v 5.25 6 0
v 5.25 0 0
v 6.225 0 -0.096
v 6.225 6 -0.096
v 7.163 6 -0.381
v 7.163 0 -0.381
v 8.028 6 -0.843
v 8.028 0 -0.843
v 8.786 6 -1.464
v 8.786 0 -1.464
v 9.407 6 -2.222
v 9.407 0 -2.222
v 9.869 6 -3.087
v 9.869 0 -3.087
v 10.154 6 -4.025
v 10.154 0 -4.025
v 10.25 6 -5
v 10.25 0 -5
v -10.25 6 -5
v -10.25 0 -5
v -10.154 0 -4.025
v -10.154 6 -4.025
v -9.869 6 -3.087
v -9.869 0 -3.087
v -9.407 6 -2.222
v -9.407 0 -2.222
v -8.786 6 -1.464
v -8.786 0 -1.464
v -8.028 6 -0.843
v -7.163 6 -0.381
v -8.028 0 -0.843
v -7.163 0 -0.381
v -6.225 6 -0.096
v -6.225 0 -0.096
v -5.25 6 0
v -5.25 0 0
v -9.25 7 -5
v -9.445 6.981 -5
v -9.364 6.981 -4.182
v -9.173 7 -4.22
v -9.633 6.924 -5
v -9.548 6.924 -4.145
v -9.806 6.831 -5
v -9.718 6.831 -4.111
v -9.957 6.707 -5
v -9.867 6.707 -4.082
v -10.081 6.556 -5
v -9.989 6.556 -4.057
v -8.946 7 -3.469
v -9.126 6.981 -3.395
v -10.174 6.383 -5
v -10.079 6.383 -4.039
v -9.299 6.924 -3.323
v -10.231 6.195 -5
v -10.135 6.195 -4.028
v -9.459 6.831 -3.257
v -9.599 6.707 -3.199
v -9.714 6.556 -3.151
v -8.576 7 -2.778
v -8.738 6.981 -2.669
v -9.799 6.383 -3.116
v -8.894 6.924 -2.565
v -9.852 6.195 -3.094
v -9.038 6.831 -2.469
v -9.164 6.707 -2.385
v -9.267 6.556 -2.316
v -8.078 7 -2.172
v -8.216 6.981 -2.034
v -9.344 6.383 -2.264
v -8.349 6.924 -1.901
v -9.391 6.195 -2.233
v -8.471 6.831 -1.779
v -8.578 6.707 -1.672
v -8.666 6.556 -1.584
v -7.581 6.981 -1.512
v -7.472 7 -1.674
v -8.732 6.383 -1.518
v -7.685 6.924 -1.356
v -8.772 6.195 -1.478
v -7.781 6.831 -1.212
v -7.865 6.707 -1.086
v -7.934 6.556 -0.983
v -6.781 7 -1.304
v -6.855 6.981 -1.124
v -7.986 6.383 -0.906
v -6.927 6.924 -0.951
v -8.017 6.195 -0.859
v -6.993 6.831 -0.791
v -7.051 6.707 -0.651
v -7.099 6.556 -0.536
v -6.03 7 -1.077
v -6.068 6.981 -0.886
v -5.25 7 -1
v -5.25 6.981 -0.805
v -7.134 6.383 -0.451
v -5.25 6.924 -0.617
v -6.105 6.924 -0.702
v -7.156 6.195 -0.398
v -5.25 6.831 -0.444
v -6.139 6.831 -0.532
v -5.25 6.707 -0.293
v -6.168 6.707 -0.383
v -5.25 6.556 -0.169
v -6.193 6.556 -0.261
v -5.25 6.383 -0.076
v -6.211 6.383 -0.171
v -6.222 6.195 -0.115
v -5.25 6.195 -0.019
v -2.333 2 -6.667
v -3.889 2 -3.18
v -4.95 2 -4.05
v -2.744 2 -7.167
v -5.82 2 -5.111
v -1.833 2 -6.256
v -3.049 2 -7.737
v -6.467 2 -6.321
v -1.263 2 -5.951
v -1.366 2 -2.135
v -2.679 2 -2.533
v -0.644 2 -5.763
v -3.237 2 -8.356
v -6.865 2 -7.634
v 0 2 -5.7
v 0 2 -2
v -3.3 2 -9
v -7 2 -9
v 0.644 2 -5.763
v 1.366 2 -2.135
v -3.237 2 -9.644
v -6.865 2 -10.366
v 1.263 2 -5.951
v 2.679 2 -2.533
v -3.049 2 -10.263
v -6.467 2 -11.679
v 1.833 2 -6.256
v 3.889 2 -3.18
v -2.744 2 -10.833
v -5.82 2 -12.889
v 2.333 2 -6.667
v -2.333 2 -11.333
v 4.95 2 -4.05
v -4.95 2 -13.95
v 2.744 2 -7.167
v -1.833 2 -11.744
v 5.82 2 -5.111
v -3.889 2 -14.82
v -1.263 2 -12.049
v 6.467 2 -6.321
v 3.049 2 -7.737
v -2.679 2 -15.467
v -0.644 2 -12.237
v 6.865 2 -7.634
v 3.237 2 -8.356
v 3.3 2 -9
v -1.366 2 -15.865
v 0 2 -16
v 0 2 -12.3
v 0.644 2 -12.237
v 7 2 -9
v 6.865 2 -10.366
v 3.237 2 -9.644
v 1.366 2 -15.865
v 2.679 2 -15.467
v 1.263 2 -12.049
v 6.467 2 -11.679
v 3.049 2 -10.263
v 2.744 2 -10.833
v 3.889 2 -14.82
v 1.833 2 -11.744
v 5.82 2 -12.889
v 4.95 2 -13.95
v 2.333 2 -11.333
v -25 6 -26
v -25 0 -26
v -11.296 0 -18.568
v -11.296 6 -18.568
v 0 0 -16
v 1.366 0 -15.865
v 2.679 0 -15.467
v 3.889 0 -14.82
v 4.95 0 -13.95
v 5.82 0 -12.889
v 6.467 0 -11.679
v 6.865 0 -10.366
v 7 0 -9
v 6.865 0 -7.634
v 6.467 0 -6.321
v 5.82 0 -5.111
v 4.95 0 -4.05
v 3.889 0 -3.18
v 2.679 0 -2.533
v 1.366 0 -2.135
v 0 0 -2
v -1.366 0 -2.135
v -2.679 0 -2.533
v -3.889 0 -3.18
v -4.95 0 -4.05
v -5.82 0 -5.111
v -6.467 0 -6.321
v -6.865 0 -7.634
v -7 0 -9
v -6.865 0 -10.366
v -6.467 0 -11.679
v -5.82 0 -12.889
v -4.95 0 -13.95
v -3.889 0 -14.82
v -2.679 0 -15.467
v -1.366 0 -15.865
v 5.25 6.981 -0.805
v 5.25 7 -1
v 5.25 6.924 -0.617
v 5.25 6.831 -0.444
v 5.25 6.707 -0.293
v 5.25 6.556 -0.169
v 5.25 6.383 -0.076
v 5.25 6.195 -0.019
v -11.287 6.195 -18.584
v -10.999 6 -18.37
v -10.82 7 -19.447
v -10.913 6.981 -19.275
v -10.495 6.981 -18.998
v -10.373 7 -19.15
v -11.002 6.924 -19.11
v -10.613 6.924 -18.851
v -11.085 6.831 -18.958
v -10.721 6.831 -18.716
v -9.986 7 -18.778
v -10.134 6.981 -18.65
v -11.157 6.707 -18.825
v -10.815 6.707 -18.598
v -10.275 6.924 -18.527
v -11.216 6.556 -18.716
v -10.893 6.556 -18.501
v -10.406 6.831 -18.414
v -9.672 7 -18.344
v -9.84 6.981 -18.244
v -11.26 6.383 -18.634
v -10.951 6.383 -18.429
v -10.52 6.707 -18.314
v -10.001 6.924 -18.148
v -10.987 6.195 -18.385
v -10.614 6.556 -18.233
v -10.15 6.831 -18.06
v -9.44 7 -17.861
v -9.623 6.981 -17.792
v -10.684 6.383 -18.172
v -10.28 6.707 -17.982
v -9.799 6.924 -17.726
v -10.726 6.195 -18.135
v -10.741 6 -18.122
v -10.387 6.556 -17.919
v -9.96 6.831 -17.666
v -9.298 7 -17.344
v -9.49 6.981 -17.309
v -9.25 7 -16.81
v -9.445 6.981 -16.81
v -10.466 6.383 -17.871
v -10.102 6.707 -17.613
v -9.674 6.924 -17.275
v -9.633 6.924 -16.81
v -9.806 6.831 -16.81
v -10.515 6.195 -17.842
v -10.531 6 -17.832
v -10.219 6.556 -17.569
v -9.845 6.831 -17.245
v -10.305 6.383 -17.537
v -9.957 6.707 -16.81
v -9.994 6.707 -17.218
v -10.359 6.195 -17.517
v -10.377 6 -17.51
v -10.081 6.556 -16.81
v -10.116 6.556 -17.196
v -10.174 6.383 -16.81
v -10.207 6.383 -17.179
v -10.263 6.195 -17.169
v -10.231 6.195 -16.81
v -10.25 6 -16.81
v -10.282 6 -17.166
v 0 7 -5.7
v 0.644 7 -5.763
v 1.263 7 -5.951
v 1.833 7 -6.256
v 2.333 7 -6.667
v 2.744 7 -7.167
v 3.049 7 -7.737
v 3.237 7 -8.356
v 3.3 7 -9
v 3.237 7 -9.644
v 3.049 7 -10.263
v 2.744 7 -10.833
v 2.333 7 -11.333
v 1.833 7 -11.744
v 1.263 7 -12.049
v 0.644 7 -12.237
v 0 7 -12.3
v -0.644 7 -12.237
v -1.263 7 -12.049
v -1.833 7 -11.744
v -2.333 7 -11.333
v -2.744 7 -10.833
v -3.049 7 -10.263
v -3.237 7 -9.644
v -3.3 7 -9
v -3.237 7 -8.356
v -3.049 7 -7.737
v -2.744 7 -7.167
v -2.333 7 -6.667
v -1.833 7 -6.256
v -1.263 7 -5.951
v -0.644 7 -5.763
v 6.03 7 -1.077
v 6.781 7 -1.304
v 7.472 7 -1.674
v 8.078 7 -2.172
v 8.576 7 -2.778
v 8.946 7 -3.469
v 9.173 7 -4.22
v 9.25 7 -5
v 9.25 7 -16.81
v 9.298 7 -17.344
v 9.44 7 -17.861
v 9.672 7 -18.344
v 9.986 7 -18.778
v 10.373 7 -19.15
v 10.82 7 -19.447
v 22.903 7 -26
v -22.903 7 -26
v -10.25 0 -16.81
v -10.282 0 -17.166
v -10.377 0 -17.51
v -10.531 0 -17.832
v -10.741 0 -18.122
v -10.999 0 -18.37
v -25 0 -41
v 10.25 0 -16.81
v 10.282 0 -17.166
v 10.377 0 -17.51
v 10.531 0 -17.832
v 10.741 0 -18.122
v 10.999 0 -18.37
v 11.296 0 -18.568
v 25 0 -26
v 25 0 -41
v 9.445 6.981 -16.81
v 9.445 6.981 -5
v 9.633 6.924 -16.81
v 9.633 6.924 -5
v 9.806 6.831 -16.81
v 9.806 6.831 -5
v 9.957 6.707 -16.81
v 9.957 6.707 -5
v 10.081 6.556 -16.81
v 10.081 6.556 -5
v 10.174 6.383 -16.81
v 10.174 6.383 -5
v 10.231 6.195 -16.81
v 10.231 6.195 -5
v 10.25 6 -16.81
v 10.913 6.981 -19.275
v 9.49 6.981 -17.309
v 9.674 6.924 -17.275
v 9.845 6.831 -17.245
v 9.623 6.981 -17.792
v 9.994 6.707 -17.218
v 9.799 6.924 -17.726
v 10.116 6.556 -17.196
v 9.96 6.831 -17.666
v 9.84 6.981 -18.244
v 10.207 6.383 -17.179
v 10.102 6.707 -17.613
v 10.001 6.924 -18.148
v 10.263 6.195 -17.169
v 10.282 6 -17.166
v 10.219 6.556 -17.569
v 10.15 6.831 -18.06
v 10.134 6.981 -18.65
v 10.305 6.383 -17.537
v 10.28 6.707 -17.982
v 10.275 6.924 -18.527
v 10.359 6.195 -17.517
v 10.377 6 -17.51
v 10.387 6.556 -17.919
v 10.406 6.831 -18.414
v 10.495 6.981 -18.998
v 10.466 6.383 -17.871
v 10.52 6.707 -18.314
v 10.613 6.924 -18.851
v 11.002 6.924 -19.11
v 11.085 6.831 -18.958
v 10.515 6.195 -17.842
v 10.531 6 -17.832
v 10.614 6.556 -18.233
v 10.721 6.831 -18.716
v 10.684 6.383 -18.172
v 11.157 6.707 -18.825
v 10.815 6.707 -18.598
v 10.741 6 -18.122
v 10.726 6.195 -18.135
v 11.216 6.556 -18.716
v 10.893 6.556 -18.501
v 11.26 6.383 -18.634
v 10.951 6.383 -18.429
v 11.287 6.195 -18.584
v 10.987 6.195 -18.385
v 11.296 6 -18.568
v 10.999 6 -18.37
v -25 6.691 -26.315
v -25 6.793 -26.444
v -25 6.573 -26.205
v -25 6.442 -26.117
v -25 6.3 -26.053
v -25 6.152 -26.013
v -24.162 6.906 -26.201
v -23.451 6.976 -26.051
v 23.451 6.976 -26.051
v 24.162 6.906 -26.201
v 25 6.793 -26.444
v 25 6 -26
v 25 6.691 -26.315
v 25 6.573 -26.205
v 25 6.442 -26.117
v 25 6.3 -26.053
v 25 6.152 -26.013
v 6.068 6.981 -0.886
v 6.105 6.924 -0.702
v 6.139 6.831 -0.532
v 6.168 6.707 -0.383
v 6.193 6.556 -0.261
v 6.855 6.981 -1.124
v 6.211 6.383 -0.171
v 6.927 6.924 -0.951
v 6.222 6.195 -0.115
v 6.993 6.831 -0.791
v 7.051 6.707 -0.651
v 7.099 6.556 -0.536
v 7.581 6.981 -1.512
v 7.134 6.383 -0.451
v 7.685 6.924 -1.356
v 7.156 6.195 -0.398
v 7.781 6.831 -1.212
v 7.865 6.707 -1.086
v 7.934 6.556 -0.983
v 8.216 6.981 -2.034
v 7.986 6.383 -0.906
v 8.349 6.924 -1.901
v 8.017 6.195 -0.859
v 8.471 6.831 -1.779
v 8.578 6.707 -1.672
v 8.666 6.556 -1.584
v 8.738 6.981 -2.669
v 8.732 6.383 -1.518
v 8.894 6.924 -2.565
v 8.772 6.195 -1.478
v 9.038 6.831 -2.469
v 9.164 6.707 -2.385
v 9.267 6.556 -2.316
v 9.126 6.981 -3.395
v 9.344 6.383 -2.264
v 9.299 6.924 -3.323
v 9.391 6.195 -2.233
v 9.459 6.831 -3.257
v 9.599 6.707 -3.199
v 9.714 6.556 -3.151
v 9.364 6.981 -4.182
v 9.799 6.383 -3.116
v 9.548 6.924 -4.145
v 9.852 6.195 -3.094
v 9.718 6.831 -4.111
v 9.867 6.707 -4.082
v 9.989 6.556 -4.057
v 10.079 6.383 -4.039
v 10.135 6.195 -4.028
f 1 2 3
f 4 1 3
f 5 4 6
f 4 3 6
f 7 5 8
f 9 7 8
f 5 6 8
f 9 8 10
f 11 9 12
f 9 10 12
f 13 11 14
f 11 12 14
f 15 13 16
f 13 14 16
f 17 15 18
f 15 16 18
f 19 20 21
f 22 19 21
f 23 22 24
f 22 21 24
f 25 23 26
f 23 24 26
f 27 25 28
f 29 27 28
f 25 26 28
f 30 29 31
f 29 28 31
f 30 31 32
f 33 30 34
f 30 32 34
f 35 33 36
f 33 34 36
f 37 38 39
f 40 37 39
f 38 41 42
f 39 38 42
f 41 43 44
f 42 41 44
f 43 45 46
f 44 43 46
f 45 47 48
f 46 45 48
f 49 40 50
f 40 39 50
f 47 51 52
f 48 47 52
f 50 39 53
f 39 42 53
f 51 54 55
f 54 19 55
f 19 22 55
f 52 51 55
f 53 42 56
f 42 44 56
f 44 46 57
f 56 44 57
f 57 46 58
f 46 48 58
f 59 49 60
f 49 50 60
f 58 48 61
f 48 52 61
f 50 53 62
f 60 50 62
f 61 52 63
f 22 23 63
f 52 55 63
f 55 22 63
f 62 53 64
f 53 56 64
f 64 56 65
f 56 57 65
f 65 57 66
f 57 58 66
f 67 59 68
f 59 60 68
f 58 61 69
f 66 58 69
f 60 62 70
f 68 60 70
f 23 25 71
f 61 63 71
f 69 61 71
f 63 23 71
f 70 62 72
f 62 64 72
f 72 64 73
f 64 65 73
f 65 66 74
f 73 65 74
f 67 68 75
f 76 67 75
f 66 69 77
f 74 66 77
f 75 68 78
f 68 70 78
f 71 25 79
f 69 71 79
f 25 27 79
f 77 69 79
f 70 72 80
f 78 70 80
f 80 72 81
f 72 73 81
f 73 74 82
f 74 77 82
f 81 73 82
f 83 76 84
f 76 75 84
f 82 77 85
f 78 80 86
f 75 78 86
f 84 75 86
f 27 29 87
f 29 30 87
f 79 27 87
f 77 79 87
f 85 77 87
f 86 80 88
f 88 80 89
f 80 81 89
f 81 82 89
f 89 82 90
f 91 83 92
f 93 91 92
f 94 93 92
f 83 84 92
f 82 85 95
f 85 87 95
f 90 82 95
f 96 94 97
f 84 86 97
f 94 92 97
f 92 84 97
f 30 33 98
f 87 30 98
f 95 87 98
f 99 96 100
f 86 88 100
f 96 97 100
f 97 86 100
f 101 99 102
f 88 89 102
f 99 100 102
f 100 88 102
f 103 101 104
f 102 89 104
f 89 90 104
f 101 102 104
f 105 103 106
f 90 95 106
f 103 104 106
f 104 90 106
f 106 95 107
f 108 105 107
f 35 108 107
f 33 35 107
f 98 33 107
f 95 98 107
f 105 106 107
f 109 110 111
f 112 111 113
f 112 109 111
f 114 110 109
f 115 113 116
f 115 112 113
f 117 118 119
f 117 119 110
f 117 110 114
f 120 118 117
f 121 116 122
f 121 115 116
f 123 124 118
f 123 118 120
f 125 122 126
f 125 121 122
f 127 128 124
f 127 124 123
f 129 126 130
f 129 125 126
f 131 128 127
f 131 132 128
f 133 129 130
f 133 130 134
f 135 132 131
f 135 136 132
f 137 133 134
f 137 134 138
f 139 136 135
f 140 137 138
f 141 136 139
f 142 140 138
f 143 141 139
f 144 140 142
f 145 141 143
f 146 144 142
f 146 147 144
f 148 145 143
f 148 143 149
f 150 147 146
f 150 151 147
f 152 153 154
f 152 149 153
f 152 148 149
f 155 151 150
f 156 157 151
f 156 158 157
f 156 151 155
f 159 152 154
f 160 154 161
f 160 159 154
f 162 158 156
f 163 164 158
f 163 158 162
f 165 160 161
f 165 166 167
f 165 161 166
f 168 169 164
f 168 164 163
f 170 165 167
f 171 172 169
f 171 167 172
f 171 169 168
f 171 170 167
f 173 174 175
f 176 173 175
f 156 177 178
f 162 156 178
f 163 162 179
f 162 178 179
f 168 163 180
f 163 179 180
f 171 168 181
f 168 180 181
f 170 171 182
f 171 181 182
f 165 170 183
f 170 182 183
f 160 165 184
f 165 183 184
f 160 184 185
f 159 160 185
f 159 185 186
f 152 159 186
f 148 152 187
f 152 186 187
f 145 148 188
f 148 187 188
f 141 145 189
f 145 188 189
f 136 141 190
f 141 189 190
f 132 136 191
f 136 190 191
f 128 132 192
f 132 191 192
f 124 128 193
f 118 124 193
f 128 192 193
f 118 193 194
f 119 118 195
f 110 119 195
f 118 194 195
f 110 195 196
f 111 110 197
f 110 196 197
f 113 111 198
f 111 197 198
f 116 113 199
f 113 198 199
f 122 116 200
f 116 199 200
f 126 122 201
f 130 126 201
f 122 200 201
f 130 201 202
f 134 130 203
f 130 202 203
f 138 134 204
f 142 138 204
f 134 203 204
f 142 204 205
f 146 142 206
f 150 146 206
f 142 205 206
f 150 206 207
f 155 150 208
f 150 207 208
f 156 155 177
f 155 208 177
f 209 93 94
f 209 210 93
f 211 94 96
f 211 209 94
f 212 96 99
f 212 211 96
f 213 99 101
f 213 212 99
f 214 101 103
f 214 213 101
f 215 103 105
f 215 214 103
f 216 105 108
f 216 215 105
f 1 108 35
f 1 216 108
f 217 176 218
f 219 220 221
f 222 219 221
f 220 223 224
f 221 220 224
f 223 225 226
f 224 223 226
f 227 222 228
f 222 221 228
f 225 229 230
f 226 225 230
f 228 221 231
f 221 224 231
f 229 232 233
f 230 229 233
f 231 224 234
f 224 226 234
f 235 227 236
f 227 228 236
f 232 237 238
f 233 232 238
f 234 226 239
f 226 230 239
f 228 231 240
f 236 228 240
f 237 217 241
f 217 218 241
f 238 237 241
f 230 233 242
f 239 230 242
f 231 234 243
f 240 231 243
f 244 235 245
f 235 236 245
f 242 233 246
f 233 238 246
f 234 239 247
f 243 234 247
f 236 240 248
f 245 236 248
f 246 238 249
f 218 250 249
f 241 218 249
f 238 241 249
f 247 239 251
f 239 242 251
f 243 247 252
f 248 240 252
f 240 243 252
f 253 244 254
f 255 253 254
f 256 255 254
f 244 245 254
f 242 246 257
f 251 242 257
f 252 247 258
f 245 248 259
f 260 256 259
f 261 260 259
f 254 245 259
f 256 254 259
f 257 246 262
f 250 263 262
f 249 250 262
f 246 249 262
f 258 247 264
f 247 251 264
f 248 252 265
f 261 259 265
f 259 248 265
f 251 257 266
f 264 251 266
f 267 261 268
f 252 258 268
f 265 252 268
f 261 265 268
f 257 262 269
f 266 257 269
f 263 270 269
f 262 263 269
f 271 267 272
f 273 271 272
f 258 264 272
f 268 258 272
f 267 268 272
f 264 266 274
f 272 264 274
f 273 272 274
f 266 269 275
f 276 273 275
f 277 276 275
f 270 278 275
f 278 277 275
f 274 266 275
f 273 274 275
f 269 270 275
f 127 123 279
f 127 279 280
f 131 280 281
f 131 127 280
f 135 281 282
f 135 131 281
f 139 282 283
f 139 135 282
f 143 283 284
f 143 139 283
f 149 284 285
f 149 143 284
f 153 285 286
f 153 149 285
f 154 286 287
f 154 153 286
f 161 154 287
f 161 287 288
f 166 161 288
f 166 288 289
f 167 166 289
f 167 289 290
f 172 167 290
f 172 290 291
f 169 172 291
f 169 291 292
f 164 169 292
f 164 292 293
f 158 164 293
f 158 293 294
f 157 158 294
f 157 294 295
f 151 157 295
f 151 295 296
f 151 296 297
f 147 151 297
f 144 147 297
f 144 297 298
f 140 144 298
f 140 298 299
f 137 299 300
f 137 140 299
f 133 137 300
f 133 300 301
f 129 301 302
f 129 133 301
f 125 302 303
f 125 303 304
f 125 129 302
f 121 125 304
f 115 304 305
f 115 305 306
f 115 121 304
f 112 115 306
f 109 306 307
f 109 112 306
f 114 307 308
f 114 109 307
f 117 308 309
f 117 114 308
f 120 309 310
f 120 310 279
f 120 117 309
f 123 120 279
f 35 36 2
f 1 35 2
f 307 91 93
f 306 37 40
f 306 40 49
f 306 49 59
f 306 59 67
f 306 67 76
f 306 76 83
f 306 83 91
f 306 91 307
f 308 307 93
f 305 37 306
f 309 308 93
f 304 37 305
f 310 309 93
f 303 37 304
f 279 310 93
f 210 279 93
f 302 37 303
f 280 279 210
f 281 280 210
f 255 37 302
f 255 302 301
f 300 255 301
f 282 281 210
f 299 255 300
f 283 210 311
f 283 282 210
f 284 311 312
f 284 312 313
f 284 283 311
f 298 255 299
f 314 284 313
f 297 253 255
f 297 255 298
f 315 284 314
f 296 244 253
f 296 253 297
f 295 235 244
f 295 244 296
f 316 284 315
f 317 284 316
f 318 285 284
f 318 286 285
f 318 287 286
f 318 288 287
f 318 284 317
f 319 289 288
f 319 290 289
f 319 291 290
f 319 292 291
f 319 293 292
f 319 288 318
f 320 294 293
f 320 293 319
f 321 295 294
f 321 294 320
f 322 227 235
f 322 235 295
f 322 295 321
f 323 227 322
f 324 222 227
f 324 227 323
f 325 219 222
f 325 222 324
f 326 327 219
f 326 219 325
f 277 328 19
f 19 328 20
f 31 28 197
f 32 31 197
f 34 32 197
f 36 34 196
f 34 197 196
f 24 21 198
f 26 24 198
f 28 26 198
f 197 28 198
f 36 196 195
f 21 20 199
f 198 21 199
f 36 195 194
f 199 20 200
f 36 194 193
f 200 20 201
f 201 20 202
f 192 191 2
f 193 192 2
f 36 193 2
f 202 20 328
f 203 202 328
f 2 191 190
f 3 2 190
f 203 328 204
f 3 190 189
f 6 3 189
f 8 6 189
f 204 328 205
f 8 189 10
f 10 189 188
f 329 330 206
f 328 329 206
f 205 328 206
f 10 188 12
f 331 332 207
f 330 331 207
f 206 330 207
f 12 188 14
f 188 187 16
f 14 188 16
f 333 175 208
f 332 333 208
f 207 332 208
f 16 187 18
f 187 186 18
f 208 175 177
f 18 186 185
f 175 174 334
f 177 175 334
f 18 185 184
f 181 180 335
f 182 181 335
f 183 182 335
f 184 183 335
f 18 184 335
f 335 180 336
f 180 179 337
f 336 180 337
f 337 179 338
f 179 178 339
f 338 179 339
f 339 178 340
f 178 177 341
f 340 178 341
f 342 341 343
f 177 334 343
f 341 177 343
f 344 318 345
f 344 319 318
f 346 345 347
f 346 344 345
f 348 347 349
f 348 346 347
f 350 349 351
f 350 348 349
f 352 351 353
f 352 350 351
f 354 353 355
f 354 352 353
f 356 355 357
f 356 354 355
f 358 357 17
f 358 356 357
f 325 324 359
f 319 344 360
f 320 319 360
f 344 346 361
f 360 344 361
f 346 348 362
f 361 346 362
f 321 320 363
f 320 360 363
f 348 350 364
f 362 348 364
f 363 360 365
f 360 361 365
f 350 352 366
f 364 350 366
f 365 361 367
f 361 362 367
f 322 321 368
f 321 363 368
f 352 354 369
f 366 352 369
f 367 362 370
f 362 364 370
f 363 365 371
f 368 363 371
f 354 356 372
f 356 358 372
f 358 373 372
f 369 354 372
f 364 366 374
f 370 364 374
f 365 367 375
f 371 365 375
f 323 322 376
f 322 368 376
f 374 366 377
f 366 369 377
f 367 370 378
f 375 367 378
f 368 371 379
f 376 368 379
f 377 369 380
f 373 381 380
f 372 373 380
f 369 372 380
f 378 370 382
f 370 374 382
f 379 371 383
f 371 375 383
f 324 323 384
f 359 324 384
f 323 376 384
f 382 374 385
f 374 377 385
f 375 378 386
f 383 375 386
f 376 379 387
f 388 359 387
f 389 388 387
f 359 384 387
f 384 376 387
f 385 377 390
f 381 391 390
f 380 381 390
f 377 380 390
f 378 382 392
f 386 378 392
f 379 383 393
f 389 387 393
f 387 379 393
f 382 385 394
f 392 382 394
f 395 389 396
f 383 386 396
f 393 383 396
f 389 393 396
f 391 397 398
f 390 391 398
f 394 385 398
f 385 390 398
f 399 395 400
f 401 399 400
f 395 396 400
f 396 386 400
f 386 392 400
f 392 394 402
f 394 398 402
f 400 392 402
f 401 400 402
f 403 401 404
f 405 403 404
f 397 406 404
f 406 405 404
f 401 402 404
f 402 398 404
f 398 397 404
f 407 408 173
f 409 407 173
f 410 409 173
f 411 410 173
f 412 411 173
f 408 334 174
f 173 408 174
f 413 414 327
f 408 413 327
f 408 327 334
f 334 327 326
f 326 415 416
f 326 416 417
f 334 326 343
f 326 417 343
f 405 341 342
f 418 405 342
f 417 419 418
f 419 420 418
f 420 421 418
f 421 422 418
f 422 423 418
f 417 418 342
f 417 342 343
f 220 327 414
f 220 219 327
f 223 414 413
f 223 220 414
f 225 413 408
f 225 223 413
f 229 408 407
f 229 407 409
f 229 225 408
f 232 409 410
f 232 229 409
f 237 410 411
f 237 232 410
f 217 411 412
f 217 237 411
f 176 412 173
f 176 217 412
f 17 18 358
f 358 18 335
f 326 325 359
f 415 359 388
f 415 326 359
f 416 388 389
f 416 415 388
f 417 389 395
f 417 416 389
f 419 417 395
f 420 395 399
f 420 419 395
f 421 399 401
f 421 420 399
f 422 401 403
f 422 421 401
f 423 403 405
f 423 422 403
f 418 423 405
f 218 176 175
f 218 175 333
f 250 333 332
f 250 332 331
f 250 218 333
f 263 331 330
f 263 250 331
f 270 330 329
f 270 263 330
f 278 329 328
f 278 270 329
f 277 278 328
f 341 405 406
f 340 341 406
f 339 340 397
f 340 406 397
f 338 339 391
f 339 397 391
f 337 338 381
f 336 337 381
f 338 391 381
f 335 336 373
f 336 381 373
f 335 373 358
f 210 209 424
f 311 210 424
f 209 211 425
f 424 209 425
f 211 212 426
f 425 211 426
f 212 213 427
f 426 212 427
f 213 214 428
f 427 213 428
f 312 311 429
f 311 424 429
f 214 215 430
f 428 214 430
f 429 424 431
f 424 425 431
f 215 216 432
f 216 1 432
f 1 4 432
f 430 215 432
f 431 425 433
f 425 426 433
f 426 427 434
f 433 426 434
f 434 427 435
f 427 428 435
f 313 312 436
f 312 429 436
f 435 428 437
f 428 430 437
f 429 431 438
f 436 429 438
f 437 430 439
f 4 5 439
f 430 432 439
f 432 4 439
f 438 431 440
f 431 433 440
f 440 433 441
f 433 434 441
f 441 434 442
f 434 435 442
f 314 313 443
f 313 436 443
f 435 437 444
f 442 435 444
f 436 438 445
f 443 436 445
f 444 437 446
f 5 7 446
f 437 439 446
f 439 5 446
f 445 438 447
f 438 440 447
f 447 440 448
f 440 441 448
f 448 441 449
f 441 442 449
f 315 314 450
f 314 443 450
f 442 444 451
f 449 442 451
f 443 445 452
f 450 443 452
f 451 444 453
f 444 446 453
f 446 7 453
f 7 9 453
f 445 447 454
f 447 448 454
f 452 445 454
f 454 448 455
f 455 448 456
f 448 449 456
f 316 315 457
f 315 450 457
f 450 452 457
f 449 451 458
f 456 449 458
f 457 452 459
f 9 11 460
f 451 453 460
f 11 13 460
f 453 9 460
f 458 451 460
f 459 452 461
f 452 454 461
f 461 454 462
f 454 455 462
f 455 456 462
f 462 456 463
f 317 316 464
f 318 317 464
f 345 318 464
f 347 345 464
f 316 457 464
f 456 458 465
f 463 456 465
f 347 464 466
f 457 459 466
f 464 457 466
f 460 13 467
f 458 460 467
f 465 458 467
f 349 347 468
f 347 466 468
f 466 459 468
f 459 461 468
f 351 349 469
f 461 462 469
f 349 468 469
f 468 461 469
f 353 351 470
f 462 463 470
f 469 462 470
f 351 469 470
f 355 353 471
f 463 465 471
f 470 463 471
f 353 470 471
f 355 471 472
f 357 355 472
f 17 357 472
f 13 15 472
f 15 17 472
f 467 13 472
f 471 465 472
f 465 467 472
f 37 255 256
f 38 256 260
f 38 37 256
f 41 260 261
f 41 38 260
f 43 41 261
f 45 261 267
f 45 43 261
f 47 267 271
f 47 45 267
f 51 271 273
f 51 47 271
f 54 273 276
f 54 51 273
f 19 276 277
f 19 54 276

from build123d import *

# Parameters (mm, degrees)
SKETCH1_R           = 3.3
BOSS_EXTRUDE1_DEPTH = 7
CUT_EXTRUDE1_DEPTH  = 66.038450166
SKETCH4_R           = 7
CUT_EXTRUDE2_DEPTH  = 2
FILLET1_R           = 2
FILLET2_R           = 1


with BuildPart() as part:
    # Sketch1 → Boss-Extrude1 (new body)
    with BuildSketch(Plane(origin=(0, 0, 0), x_dir=(1, 0, 0), z_dir=(0, 1, 0))):
        with BuildLine():
            Line((10.25, 18), (25, 26))
            Line((25, 26), (25, 41))
            Line((25, 41), (-25, 41))
            Line((-25, 41), (-25, 26))
            Line((-25, 26), (-10.25, 18))
            Line((-10.25, 18), (-10.25, 5))
            ThreePointArc((-10.25, 5), (-8.785533906, 1.464466094), (-5.25, 0))
            Line((-5.25, 0), (0, 0))
            Line((0, 0), (5.25, 0))
            ThreePointArc((5.25, 0), (8.785533906, 1.464466094), (10.25, 5))
            Line((10.25, 5), (10.25, 18))
        make_face()
        with Locations(Location((0, 9, 0), (0, 0, 270))):
            Circle(SKETCH1_R, mode=Mode.SUBTRACT)
    extrude(amount=BOSS_EXTRUDE1_DEPTH)

    # Sketch2 → Cut-Extrude1 (cut, through all)
    with BuildSketch(Plane(origin=(25, 0, 0), x_dir=(0, 0, -1), z_dir=(1, 0, 0))):
        Polygon((26, 7), (41, 0), (41, 7), align=None)
    extrude(amount=-CUT_EXTRUDE1_DEPTH, mode=Mode.SUBTRACT)

    # Sketch4 → Cut-Extrude2 (cut)
    with BuildSketch(Plane.XZ):
        with Locations(Location((0, -9, 0), (0, 0, 270))):
            Circle(SKETCH4_R)
    extrude(amount=-CUT_EXTRUDE2_DEPTH, mode=Mode.SUBTRACT)

    # Fillet1
    fillet1_edges = [part.edges().sort_by_distance(p)[0] for p in [
        (-10.25, 3.5, -18),
        (10.25, 3.5, -18),
    ]]
    fillet(fillet1_edges, radius=FILLET1_R)

    # Fillet2
    fillet2_edges = [part.edges().sort_by_distance(p)[0] for p in [
        (10.25, 7, -10.904757682),
        (-18.14823696, 7, -22.283789537),
        (-8.785533906, 7, -1.464466094),
        (0, 7, 0),
        (18.14823696, 7, -22.283789537),
        (-10.25, 7, -10.904757682),
        (10.531417421, 7, -17.832488442),
        (-10.531417421, 7, -17.832488442),
        (8.785533906, 7, -1.464466094),
    ]]
    fillet(fillet2_edges, radius=FILLET2_R)


solid = part.part
